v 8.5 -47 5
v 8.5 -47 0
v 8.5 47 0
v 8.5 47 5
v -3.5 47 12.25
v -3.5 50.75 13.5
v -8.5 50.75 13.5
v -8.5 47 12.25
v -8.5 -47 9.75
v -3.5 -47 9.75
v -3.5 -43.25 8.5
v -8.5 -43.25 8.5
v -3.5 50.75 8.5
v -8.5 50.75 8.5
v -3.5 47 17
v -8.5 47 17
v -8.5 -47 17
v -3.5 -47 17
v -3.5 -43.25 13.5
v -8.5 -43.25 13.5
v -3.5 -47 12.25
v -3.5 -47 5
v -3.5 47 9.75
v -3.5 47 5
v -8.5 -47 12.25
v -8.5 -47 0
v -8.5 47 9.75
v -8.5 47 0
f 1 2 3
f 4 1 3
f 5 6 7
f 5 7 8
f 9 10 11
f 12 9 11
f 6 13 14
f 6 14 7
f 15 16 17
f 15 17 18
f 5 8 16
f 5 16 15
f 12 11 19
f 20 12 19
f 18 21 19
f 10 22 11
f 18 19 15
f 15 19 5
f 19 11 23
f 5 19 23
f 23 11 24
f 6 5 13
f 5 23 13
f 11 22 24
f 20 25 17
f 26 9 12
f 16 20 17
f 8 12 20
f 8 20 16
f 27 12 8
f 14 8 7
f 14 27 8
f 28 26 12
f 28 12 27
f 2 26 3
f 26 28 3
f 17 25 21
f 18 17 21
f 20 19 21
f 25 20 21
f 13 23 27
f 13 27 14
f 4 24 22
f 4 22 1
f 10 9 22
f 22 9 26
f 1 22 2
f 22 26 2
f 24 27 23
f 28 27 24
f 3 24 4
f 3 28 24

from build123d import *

# Parameters (mm, degrees)
F1_DEPTH = 5
F2_W     = 5
F2_H     = 94
F3_DEPTH = 12
F5_DEPTH = 5
F8_DEPTH = 5


with BuildPart() as f1:
    # F0 (on Top) → F1 (new body)
    with BuildSketch(Plane.XY):
        Polygon((-8.5, -47), (8.5, -47), (8.5, 47), (3.75, 47), (1.25, 47), (-8.5, 47), align=None)
    extrude(amount=F1_DEPTH)

    # F2 (on face) → F3 (join)
    with BuildSketch(Plane.XY.offset(5)):
        with Locations((-6, 0)):
            Rectangle(F2_W, F2_H)
    extrude(amount=F3_DEPTH)


with BuildPart() as f5:
    # F4 (on face) → F5 (new body)
    with BuildSketch(Plane.YZ.offset(-3.5)):
        Polygon((50.75, 13.5), (47, 12.25), (47, 9.75), (50.75, 8.5), align=None)
    extrude(amount=-F5_DEPTH)


with BuildPart() as f1_1:
    add(f1.part)

    # F6: union F5
    add(f5.part)

    # F7 (on face) → F8 (cut)
    with BuildSketch(Plane.YZ.offset(-3.5)):
        Polygon((-47, 12.25), (-47, 9.75), (-43.25, 8.5), (-43.25, 13.5), align=None)
    extrude(amount=-F8_DEPTH, mode=Mode.SUBTRACT)


solid = f1_1.part
